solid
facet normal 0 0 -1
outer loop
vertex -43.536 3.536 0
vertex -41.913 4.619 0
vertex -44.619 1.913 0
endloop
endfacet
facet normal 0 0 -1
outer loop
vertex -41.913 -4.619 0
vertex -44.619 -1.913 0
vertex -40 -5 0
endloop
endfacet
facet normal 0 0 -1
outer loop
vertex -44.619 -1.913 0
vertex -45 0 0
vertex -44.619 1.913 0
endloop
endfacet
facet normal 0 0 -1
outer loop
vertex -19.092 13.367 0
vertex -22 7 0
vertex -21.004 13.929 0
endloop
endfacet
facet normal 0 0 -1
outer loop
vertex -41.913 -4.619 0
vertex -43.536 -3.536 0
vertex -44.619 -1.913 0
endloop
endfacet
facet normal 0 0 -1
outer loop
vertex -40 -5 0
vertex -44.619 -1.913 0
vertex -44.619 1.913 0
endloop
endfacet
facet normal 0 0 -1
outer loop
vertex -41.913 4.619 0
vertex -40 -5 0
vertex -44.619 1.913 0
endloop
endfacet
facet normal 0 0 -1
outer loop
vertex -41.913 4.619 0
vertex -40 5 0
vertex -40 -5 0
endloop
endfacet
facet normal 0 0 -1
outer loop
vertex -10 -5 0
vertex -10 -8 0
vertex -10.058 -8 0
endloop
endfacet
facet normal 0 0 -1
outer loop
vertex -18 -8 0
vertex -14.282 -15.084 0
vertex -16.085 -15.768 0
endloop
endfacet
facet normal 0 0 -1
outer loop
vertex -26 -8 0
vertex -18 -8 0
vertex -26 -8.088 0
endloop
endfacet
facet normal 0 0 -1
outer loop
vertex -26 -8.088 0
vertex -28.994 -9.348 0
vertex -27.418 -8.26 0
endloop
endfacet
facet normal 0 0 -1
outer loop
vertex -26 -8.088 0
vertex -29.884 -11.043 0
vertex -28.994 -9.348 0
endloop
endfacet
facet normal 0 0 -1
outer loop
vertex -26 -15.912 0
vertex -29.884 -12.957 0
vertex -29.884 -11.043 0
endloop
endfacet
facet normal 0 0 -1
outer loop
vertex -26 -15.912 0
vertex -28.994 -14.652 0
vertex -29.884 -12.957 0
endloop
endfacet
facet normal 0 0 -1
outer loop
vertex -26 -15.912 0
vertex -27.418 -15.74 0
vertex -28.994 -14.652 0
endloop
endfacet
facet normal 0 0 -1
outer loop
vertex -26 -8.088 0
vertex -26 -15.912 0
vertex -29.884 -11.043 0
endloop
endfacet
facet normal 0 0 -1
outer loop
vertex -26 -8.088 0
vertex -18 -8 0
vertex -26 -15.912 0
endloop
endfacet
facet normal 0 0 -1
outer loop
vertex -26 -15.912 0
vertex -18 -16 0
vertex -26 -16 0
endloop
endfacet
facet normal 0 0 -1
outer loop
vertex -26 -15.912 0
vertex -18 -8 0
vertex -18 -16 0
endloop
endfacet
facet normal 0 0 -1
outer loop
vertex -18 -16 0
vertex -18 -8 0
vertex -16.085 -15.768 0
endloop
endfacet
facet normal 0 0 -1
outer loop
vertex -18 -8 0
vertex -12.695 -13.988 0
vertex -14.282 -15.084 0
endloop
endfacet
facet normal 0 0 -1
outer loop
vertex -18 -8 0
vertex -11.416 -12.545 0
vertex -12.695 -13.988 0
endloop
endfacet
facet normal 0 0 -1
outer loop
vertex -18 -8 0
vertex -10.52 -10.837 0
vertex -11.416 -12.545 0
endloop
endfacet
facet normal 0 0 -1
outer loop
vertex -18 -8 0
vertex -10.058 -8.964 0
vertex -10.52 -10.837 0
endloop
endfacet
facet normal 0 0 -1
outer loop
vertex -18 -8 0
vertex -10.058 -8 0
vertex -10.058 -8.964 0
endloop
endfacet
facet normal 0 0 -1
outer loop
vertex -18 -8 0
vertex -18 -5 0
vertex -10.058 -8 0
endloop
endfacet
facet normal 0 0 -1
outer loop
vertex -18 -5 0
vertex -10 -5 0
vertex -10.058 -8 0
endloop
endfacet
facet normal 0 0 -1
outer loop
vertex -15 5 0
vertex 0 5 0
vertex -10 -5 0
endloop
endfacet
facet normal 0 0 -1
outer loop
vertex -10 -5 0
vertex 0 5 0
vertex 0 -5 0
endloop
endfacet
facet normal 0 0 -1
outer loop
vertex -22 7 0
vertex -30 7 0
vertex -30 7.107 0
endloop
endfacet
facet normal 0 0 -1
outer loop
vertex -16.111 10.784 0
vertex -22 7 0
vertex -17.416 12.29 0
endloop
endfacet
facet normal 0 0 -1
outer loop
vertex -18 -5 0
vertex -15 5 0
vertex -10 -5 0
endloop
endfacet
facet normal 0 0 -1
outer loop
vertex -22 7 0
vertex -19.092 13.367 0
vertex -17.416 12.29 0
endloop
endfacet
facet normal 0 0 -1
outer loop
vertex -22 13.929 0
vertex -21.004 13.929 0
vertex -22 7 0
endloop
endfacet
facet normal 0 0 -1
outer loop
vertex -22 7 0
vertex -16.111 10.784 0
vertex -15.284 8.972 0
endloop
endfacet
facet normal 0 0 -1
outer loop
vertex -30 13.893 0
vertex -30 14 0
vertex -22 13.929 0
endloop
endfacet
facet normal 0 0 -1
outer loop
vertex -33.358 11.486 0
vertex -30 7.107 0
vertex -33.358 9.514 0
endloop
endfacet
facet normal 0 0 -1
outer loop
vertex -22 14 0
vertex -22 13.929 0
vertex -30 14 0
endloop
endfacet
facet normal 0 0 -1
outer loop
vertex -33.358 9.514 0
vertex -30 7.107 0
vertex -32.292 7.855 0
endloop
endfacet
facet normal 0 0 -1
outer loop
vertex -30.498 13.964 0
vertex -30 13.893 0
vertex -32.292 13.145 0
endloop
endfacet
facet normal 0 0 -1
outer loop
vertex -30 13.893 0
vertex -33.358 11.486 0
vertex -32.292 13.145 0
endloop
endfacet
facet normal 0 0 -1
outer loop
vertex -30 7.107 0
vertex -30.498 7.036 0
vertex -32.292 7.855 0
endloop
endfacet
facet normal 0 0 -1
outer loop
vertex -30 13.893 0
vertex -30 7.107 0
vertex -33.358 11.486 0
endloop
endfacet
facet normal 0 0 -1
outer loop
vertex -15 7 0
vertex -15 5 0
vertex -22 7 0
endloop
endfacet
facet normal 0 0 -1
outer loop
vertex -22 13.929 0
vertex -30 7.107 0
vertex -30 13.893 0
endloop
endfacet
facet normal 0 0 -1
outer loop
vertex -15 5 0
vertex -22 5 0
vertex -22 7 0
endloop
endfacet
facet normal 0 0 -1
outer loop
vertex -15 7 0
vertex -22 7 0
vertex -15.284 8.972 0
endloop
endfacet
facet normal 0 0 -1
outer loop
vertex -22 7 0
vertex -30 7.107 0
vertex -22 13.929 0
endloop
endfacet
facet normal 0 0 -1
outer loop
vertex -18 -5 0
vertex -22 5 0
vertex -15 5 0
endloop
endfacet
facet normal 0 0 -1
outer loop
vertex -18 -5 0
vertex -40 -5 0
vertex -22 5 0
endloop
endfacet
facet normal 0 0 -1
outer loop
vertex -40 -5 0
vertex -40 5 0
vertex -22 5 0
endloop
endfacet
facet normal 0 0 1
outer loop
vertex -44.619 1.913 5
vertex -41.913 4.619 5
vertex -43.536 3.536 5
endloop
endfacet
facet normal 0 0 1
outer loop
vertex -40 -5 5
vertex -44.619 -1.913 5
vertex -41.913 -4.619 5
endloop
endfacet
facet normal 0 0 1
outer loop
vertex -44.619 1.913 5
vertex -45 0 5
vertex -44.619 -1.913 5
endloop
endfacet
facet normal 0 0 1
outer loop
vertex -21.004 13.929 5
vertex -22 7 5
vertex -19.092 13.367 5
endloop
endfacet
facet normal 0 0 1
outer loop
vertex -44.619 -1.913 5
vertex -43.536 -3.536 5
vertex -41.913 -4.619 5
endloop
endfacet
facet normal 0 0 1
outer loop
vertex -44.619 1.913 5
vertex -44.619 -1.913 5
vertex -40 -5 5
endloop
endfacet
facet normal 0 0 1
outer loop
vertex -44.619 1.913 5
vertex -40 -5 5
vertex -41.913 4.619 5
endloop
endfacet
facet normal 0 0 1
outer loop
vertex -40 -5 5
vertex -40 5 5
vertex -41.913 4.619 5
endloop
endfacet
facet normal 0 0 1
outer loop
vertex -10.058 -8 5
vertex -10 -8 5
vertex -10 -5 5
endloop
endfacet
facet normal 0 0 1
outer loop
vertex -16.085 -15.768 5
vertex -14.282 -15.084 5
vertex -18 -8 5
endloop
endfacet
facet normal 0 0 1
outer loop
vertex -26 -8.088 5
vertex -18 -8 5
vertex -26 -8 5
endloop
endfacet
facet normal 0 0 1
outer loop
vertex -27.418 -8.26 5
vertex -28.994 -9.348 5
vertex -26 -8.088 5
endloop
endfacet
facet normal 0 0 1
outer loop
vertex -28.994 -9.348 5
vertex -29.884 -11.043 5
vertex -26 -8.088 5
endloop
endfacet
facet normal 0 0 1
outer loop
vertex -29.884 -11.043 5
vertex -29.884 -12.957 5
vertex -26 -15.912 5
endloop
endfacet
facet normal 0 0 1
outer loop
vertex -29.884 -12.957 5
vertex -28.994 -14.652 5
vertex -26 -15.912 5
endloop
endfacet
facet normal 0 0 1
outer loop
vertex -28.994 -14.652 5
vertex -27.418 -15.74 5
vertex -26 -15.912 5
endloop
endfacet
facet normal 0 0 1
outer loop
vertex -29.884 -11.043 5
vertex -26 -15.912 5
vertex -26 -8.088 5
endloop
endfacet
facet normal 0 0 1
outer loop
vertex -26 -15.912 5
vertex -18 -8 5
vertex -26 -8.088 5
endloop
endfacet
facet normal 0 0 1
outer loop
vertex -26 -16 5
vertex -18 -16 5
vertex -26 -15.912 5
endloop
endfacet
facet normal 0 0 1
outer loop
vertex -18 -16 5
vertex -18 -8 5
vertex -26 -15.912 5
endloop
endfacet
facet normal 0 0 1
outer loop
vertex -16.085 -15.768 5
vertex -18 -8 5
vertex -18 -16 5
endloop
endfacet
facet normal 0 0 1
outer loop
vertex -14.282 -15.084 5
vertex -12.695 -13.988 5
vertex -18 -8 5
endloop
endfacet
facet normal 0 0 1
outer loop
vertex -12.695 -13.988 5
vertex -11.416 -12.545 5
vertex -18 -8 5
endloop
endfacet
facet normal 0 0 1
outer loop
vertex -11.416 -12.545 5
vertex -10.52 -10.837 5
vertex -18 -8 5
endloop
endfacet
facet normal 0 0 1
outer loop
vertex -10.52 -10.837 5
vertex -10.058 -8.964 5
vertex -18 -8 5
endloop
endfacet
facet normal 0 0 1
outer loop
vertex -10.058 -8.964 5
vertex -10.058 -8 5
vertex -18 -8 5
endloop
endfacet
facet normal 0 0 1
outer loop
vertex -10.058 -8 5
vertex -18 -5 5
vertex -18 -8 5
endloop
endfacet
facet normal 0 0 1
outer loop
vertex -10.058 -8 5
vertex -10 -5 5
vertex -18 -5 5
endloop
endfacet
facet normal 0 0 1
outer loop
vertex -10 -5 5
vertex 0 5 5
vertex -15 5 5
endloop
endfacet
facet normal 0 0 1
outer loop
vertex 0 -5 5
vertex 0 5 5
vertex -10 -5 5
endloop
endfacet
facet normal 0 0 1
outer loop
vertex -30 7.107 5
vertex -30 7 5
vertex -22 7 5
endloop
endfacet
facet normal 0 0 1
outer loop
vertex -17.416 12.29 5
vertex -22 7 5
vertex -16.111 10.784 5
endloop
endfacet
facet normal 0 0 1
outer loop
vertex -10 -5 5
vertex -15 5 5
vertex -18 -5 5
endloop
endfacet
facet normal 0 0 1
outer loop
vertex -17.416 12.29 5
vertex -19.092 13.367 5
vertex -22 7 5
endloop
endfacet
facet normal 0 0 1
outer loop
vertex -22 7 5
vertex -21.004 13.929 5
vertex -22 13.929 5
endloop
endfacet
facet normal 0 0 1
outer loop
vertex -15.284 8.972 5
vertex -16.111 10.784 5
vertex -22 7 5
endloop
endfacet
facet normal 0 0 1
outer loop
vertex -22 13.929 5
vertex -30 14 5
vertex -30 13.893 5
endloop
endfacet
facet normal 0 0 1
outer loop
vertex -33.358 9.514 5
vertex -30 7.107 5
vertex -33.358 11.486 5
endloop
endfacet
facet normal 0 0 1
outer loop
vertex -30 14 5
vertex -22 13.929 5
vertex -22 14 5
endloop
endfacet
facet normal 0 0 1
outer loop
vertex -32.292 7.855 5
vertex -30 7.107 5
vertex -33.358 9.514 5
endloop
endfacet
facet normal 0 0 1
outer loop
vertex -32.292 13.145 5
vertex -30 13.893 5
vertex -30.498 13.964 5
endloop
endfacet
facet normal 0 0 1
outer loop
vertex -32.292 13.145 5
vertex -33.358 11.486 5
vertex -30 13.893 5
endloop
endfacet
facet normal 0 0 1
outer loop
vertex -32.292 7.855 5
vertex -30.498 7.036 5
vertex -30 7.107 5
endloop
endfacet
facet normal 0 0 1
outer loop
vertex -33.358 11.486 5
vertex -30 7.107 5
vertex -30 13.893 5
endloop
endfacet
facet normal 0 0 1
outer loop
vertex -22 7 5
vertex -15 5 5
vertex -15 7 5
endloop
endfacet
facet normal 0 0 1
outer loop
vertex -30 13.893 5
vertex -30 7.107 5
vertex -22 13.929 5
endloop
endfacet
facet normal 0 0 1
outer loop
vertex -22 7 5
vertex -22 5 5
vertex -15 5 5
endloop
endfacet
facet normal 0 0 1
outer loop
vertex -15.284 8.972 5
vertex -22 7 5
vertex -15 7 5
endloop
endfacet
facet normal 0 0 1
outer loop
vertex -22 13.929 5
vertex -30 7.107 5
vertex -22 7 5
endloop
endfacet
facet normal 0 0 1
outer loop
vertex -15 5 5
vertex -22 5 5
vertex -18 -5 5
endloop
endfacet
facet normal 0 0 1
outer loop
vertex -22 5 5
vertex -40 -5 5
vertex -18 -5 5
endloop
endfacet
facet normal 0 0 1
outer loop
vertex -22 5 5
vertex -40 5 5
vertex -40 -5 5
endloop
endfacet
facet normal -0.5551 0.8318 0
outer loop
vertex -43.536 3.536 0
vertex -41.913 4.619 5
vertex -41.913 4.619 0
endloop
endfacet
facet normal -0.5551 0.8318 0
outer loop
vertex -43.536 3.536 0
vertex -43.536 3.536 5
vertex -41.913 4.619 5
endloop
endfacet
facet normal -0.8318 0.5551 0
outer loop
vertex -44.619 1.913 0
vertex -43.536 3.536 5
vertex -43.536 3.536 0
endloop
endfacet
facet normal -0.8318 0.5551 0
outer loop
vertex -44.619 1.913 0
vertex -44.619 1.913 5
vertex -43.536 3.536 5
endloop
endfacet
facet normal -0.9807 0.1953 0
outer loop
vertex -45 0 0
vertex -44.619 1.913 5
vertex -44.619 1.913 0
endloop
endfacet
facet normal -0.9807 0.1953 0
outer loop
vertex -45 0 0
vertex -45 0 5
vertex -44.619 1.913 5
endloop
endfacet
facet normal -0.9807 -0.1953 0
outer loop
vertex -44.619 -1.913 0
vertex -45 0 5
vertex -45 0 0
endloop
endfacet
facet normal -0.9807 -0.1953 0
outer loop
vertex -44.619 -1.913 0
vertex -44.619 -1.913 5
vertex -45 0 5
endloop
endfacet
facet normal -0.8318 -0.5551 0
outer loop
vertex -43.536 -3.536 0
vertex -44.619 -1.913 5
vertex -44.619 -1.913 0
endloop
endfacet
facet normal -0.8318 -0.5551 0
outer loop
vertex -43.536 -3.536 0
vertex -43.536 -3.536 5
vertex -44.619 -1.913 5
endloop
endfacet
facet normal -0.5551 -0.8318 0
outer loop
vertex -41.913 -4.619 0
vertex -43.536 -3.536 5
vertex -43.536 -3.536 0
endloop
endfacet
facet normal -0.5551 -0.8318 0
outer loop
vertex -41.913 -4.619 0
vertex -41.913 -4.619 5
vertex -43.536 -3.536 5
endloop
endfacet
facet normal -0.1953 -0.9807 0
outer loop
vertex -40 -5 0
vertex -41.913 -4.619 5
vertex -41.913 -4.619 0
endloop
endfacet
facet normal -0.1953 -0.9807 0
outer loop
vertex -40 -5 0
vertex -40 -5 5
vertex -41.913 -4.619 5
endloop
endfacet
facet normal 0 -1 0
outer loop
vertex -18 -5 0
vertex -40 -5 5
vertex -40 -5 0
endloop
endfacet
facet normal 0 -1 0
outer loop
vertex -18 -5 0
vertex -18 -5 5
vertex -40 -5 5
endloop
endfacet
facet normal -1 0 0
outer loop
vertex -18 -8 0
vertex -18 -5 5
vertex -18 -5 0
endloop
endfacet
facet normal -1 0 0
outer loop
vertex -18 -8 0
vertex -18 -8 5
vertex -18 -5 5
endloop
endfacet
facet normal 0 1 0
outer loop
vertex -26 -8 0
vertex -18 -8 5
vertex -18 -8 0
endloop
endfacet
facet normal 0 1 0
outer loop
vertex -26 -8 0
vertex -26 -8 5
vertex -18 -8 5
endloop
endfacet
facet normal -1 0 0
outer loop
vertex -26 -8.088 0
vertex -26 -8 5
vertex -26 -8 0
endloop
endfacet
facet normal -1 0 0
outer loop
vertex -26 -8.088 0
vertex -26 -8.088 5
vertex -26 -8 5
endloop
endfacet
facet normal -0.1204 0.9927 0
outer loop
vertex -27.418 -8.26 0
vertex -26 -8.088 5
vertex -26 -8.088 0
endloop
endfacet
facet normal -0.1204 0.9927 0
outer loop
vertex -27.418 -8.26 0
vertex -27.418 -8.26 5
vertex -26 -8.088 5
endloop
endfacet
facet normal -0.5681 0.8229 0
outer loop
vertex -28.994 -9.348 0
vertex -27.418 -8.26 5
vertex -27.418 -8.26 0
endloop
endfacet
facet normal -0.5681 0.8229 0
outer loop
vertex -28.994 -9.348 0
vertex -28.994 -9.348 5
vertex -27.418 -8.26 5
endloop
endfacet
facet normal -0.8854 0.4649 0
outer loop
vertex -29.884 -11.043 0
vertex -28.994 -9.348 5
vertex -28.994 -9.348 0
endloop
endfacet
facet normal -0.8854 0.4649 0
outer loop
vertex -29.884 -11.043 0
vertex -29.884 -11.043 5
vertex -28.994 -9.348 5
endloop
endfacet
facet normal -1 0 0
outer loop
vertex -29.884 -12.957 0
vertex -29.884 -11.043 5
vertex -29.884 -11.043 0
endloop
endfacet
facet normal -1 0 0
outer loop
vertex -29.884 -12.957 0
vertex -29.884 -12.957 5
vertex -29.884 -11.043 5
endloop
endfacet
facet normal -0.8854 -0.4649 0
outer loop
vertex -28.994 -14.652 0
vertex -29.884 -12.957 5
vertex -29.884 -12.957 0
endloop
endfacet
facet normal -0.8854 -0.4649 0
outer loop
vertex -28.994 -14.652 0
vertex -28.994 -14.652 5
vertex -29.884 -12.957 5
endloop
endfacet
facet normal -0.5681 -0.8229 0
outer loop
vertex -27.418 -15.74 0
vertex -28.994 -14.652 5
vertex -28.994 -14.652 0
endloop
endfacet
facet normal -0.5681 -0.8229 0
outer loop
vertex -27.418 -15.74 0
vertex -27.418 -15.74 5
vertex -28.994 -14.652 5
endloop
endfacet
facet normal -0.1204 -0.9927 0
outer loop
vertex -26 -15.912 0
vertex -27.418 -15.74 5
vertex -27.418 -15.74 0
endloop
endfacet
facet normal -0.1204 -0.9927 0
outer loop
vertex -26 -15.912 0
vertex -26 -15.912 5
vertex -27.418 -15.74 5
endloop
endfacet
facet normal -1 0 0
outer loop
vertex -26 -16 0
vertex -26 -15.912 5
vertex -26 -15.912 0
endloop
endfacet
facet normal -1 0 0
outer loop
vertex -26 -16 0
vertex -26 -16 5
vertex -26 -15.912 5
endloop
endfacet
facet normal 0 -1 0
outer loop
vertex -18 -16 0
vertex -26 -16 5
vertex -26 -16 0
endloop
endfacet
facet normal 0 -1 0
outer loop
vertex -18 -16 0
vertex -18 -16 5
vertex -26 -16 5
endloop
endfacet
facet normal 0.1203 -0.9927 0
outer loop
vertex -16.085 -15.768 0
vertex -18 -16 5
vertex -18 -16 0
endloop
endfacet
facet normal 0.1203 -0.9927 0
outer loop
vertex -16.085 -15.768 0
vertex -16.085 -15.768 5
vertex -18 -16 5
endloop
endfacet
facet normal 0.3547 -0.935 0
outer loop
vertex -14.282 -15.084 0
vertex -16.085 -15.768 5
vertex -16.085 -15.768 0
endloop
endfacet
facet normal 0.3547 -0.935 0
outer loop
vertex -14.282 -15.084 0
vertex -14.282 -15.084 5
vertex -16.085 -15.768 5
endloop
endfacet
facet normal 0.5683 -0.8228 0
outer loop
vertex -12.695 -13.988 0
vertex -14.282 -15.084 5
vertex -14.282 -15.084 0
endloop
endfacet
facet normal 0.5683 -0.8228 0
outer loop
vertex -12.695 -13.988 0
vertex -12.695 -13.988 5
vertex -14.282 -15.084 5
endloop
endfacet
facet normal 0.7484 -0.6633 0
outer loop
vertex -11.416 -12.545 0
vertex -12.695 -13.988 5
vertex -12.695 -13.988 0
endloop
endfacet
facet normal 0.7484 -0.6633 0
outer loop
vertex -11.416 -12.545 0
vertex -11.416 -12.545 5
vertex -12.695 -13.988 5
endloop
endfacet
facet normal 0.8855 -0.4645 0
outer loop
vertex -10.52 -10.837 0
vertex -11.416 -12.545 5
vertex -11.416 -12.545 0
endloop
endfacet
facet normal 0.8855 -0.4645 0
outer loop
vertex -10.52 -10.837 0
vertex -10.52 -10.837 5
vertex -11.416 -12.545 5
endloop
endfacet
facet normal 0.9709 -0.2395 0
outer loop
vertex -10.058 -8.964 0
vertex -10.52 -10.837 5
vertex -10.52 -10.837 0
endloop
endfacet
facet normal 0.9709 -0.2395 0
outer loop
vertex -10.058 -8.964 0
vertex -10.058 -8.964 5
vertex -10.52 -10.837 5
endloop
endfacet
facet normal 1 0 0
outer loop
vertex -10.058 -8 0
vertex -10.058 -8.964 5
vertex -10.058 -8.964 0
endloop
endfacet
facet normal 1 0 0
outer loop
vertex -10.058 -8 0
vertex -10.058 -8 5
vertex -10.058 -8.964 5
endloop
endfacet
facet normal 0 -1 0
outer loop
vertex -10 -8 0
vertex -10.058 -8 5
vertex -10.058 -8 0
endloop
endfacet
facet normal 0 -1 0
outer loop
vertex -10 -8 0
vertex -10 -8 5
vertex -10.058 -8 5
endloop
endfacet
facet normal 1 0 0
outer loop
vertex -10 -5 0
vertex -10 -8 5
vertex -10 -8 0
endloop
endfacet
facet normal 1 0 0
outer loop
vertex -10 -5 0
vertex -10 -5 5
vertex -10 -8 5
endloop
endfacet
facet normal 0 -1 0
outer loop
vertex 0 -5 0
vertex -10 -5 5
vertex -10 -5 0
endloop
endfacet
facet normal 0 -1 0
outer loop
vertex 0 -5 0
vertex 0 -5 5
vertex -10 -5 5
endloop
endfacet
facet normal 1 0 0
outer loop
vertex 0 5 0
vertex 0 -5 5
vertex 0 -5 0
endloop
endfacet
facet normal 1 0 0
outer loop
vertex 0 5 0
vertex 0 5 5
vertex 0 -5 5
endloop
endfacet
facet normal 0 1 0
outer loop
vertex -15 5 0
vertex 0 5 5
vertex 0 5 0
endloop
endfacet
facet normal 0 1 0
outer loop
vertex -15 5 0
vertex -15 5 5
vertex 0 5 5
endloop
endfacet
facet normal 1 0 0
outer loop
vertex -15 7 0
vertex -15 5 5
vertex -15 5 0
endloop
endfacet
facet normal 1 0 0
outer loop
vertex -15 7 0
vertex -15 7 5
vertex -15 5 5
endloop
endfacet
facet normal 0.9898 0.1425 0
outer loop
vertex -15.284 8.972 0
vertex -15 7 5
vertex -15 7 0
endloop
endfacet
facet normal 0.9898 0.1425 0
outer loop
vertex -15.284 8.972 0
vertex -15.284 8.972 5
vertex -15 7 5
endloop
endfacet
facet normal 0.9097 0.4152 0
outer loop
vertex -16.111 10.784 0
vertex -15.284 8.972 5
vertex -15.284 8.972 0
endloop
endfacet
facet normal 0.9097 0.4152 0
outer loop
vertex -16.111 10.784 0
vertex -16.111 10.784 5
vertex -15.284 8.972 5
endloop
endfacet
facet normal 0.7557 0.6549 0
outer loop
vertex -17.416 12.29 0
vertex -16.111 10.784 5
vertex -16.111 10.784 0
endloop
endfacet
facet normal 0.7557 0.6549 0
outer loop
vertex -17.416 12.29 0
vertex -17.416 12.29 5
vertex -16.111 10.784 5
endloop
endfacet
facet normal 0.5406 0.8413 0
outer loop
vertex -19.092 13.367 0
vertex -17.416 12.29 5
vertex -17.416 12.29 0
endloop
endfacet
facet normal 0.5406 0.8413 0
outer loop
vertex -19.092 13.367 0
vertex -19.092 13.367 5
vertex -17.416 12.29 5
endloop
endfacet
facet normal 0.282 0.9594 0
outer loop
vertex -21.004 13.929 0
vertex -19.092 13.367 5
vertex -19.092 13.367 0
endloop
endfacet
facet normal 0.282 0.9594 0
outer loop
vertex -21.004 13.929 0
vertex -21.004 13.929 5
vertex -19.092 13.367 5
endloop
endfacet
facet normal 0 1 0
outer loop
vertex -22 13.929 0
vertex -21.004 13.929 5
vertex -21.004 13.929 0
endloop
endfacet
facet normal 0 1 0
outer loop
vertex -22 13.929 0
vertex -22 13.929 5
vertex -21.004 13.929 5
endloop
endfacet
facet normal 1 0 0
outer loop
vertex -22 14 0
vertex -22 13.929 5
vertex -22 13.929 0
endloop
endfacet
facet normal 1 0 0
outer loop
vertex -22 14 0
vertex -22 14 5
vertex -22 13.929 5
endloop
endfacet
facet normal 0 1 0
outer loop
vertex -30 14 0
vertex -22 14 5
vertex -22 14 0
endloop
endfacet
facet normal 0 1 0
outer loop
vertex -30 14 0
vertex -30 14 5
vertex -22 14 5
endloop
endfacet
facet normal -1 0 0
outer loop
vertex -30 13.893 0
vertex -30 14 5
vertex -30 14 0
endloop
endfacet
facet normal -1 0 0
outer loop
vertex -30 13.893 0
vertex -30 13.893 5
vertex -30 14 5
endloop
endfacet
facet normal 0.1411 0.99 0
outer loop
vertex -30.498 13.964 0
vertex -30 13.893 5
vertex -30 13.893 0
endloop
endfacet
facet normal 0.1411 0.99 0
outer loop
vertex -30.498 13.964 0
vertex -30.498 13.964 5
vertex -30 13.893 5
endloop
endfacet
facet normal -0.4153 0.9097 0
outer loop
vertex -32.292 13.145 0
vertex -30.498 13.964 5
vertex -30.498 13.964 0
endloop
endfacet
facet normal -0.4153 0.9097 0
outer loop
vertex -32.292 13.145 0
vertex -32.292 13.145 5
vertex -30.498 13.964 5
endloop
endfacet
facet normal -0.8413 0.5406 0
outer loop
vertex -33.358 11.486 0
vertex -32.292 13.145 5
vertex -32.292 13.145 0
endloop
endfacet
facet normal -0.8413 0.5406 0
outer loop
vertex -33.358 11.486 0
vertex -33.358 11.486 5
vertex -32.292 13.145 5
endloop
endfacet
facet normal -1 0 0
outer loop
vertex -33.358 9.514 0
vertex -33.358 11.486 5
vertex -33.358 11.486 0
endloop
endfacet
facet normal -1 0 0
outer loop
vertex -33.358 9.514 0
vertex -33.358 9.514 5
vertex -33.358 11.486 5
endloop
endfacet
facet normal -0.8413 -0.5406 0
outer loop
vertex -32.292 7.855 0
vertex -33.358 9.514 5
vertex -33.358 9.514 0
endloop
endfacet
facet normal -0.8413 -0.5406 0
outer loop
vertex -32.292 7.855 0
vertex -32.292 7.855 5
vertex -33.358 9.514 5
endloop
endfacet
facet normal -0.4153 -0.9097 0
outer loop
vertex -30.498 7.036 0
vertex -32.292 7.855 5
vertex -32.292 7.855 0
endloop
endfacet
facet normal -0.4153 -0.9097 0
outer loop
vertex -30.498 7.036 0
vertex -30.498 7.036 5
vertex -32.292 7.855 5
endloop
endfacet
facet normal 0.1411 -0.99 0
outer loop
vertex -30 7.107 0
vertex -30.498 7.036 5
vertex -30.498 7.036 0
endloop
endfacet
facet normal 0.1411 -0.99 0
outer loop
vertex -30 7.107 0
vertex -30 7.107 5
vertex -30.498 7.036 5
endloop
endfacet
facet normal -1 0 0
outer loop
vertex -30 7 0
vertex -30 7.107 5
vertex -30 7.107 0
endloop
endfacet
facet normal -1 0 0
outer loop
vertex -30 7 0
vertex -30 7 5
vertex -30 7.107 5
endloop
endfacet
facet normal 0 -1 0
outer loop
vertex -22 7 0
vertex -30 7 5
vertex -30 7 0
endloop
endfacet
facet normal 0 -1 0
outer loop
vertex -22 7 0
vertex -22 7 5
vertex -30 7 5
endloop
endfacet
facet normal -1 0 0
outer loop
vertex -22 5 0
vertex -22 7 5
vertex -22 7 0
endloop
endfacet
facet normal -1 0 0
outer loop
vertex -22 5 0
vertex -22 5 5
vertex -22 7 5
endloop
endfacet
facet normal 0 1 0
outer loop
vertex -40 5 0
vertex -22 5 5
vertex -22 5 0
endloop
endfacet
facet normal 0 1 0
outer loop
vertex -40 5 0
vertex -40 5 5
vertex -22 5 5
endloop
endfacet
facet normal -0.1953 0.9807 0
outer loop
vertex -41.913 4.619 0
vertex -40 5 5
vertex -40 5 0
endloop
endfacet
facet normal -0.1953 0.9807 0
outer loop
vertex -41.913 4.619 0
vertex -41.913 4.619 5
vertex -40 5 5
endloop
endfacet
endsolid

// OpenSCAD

/* [Left Arm]*/
// arm length
leftLength=8;
// arm width
leftWidth=8;
// from trunk to arm
leftGap=3;
// quadrant of quarter circle
leftQuad=2;
// up from the bottom
leftUp=10;

/*[Trunk]*/
// Trunk Length excluding Radius of the top
trunkL=40;
// Radius of the top
trunkW=10;
// thickness of cactus
trunkT=5;

/*[Right Arm]*/
// arm length
rightLength=8;
// arm width
rightWidth=7;
// from trunk to arm
rightGap=2;
// quadrant of quarter circle
rightQuad=1;
// up from the bottom
rightUp=15;

cactus();//like thing:1052477 but customizable

module cactus(){
	linear_extrude(height=trunkT){
		translate([-rightUp, trunkW/2,0])
		arm(l=rightLength, w=rightWidth, g=rightGap, q=rightQuad);
		translate([-leftUp, -trunkW/2,0])
		arm(l=leftLength, w=leftWidth, g=leftGap, q=leftQuad);
		
		translate([-trunkL, -trunkW/2]){
			square([trunkL, trunkW]);
			translate([0, trunkW/2])
			circle(d=trunkW);
		}
	}
}

module arm(l=12, w=5, g=2, q=1, t=8){
	q1= q==1 ? 0:-1;
	q2= q==2 ? -1:1;//q=quadrand 1 or 2

	translate([-l-w, q2*w/2+q2*g])
	circle(r=w/2);
	
	translate([-l-w, q1*w+(q2*g)])//[-l-w, q1*w+(q2*g)]
	square([l, w]);
	
	translate([-w, g*q2])
	qCircle(r=w, q=q);
	
	translate([-w,g*q1])
	square([w, g]);
}

module qCircle(r=10, q=1){//q=quadrant 1, 2, 3 or 4
	rotate(-(q-1)*90)
	difference(){
		circle(r=r);
		translate([-r-1,-r-1])
		square([r+1, r*2+2]);
		translate([0,-r-1])
		square([r+2,r+1]);
	}
}
